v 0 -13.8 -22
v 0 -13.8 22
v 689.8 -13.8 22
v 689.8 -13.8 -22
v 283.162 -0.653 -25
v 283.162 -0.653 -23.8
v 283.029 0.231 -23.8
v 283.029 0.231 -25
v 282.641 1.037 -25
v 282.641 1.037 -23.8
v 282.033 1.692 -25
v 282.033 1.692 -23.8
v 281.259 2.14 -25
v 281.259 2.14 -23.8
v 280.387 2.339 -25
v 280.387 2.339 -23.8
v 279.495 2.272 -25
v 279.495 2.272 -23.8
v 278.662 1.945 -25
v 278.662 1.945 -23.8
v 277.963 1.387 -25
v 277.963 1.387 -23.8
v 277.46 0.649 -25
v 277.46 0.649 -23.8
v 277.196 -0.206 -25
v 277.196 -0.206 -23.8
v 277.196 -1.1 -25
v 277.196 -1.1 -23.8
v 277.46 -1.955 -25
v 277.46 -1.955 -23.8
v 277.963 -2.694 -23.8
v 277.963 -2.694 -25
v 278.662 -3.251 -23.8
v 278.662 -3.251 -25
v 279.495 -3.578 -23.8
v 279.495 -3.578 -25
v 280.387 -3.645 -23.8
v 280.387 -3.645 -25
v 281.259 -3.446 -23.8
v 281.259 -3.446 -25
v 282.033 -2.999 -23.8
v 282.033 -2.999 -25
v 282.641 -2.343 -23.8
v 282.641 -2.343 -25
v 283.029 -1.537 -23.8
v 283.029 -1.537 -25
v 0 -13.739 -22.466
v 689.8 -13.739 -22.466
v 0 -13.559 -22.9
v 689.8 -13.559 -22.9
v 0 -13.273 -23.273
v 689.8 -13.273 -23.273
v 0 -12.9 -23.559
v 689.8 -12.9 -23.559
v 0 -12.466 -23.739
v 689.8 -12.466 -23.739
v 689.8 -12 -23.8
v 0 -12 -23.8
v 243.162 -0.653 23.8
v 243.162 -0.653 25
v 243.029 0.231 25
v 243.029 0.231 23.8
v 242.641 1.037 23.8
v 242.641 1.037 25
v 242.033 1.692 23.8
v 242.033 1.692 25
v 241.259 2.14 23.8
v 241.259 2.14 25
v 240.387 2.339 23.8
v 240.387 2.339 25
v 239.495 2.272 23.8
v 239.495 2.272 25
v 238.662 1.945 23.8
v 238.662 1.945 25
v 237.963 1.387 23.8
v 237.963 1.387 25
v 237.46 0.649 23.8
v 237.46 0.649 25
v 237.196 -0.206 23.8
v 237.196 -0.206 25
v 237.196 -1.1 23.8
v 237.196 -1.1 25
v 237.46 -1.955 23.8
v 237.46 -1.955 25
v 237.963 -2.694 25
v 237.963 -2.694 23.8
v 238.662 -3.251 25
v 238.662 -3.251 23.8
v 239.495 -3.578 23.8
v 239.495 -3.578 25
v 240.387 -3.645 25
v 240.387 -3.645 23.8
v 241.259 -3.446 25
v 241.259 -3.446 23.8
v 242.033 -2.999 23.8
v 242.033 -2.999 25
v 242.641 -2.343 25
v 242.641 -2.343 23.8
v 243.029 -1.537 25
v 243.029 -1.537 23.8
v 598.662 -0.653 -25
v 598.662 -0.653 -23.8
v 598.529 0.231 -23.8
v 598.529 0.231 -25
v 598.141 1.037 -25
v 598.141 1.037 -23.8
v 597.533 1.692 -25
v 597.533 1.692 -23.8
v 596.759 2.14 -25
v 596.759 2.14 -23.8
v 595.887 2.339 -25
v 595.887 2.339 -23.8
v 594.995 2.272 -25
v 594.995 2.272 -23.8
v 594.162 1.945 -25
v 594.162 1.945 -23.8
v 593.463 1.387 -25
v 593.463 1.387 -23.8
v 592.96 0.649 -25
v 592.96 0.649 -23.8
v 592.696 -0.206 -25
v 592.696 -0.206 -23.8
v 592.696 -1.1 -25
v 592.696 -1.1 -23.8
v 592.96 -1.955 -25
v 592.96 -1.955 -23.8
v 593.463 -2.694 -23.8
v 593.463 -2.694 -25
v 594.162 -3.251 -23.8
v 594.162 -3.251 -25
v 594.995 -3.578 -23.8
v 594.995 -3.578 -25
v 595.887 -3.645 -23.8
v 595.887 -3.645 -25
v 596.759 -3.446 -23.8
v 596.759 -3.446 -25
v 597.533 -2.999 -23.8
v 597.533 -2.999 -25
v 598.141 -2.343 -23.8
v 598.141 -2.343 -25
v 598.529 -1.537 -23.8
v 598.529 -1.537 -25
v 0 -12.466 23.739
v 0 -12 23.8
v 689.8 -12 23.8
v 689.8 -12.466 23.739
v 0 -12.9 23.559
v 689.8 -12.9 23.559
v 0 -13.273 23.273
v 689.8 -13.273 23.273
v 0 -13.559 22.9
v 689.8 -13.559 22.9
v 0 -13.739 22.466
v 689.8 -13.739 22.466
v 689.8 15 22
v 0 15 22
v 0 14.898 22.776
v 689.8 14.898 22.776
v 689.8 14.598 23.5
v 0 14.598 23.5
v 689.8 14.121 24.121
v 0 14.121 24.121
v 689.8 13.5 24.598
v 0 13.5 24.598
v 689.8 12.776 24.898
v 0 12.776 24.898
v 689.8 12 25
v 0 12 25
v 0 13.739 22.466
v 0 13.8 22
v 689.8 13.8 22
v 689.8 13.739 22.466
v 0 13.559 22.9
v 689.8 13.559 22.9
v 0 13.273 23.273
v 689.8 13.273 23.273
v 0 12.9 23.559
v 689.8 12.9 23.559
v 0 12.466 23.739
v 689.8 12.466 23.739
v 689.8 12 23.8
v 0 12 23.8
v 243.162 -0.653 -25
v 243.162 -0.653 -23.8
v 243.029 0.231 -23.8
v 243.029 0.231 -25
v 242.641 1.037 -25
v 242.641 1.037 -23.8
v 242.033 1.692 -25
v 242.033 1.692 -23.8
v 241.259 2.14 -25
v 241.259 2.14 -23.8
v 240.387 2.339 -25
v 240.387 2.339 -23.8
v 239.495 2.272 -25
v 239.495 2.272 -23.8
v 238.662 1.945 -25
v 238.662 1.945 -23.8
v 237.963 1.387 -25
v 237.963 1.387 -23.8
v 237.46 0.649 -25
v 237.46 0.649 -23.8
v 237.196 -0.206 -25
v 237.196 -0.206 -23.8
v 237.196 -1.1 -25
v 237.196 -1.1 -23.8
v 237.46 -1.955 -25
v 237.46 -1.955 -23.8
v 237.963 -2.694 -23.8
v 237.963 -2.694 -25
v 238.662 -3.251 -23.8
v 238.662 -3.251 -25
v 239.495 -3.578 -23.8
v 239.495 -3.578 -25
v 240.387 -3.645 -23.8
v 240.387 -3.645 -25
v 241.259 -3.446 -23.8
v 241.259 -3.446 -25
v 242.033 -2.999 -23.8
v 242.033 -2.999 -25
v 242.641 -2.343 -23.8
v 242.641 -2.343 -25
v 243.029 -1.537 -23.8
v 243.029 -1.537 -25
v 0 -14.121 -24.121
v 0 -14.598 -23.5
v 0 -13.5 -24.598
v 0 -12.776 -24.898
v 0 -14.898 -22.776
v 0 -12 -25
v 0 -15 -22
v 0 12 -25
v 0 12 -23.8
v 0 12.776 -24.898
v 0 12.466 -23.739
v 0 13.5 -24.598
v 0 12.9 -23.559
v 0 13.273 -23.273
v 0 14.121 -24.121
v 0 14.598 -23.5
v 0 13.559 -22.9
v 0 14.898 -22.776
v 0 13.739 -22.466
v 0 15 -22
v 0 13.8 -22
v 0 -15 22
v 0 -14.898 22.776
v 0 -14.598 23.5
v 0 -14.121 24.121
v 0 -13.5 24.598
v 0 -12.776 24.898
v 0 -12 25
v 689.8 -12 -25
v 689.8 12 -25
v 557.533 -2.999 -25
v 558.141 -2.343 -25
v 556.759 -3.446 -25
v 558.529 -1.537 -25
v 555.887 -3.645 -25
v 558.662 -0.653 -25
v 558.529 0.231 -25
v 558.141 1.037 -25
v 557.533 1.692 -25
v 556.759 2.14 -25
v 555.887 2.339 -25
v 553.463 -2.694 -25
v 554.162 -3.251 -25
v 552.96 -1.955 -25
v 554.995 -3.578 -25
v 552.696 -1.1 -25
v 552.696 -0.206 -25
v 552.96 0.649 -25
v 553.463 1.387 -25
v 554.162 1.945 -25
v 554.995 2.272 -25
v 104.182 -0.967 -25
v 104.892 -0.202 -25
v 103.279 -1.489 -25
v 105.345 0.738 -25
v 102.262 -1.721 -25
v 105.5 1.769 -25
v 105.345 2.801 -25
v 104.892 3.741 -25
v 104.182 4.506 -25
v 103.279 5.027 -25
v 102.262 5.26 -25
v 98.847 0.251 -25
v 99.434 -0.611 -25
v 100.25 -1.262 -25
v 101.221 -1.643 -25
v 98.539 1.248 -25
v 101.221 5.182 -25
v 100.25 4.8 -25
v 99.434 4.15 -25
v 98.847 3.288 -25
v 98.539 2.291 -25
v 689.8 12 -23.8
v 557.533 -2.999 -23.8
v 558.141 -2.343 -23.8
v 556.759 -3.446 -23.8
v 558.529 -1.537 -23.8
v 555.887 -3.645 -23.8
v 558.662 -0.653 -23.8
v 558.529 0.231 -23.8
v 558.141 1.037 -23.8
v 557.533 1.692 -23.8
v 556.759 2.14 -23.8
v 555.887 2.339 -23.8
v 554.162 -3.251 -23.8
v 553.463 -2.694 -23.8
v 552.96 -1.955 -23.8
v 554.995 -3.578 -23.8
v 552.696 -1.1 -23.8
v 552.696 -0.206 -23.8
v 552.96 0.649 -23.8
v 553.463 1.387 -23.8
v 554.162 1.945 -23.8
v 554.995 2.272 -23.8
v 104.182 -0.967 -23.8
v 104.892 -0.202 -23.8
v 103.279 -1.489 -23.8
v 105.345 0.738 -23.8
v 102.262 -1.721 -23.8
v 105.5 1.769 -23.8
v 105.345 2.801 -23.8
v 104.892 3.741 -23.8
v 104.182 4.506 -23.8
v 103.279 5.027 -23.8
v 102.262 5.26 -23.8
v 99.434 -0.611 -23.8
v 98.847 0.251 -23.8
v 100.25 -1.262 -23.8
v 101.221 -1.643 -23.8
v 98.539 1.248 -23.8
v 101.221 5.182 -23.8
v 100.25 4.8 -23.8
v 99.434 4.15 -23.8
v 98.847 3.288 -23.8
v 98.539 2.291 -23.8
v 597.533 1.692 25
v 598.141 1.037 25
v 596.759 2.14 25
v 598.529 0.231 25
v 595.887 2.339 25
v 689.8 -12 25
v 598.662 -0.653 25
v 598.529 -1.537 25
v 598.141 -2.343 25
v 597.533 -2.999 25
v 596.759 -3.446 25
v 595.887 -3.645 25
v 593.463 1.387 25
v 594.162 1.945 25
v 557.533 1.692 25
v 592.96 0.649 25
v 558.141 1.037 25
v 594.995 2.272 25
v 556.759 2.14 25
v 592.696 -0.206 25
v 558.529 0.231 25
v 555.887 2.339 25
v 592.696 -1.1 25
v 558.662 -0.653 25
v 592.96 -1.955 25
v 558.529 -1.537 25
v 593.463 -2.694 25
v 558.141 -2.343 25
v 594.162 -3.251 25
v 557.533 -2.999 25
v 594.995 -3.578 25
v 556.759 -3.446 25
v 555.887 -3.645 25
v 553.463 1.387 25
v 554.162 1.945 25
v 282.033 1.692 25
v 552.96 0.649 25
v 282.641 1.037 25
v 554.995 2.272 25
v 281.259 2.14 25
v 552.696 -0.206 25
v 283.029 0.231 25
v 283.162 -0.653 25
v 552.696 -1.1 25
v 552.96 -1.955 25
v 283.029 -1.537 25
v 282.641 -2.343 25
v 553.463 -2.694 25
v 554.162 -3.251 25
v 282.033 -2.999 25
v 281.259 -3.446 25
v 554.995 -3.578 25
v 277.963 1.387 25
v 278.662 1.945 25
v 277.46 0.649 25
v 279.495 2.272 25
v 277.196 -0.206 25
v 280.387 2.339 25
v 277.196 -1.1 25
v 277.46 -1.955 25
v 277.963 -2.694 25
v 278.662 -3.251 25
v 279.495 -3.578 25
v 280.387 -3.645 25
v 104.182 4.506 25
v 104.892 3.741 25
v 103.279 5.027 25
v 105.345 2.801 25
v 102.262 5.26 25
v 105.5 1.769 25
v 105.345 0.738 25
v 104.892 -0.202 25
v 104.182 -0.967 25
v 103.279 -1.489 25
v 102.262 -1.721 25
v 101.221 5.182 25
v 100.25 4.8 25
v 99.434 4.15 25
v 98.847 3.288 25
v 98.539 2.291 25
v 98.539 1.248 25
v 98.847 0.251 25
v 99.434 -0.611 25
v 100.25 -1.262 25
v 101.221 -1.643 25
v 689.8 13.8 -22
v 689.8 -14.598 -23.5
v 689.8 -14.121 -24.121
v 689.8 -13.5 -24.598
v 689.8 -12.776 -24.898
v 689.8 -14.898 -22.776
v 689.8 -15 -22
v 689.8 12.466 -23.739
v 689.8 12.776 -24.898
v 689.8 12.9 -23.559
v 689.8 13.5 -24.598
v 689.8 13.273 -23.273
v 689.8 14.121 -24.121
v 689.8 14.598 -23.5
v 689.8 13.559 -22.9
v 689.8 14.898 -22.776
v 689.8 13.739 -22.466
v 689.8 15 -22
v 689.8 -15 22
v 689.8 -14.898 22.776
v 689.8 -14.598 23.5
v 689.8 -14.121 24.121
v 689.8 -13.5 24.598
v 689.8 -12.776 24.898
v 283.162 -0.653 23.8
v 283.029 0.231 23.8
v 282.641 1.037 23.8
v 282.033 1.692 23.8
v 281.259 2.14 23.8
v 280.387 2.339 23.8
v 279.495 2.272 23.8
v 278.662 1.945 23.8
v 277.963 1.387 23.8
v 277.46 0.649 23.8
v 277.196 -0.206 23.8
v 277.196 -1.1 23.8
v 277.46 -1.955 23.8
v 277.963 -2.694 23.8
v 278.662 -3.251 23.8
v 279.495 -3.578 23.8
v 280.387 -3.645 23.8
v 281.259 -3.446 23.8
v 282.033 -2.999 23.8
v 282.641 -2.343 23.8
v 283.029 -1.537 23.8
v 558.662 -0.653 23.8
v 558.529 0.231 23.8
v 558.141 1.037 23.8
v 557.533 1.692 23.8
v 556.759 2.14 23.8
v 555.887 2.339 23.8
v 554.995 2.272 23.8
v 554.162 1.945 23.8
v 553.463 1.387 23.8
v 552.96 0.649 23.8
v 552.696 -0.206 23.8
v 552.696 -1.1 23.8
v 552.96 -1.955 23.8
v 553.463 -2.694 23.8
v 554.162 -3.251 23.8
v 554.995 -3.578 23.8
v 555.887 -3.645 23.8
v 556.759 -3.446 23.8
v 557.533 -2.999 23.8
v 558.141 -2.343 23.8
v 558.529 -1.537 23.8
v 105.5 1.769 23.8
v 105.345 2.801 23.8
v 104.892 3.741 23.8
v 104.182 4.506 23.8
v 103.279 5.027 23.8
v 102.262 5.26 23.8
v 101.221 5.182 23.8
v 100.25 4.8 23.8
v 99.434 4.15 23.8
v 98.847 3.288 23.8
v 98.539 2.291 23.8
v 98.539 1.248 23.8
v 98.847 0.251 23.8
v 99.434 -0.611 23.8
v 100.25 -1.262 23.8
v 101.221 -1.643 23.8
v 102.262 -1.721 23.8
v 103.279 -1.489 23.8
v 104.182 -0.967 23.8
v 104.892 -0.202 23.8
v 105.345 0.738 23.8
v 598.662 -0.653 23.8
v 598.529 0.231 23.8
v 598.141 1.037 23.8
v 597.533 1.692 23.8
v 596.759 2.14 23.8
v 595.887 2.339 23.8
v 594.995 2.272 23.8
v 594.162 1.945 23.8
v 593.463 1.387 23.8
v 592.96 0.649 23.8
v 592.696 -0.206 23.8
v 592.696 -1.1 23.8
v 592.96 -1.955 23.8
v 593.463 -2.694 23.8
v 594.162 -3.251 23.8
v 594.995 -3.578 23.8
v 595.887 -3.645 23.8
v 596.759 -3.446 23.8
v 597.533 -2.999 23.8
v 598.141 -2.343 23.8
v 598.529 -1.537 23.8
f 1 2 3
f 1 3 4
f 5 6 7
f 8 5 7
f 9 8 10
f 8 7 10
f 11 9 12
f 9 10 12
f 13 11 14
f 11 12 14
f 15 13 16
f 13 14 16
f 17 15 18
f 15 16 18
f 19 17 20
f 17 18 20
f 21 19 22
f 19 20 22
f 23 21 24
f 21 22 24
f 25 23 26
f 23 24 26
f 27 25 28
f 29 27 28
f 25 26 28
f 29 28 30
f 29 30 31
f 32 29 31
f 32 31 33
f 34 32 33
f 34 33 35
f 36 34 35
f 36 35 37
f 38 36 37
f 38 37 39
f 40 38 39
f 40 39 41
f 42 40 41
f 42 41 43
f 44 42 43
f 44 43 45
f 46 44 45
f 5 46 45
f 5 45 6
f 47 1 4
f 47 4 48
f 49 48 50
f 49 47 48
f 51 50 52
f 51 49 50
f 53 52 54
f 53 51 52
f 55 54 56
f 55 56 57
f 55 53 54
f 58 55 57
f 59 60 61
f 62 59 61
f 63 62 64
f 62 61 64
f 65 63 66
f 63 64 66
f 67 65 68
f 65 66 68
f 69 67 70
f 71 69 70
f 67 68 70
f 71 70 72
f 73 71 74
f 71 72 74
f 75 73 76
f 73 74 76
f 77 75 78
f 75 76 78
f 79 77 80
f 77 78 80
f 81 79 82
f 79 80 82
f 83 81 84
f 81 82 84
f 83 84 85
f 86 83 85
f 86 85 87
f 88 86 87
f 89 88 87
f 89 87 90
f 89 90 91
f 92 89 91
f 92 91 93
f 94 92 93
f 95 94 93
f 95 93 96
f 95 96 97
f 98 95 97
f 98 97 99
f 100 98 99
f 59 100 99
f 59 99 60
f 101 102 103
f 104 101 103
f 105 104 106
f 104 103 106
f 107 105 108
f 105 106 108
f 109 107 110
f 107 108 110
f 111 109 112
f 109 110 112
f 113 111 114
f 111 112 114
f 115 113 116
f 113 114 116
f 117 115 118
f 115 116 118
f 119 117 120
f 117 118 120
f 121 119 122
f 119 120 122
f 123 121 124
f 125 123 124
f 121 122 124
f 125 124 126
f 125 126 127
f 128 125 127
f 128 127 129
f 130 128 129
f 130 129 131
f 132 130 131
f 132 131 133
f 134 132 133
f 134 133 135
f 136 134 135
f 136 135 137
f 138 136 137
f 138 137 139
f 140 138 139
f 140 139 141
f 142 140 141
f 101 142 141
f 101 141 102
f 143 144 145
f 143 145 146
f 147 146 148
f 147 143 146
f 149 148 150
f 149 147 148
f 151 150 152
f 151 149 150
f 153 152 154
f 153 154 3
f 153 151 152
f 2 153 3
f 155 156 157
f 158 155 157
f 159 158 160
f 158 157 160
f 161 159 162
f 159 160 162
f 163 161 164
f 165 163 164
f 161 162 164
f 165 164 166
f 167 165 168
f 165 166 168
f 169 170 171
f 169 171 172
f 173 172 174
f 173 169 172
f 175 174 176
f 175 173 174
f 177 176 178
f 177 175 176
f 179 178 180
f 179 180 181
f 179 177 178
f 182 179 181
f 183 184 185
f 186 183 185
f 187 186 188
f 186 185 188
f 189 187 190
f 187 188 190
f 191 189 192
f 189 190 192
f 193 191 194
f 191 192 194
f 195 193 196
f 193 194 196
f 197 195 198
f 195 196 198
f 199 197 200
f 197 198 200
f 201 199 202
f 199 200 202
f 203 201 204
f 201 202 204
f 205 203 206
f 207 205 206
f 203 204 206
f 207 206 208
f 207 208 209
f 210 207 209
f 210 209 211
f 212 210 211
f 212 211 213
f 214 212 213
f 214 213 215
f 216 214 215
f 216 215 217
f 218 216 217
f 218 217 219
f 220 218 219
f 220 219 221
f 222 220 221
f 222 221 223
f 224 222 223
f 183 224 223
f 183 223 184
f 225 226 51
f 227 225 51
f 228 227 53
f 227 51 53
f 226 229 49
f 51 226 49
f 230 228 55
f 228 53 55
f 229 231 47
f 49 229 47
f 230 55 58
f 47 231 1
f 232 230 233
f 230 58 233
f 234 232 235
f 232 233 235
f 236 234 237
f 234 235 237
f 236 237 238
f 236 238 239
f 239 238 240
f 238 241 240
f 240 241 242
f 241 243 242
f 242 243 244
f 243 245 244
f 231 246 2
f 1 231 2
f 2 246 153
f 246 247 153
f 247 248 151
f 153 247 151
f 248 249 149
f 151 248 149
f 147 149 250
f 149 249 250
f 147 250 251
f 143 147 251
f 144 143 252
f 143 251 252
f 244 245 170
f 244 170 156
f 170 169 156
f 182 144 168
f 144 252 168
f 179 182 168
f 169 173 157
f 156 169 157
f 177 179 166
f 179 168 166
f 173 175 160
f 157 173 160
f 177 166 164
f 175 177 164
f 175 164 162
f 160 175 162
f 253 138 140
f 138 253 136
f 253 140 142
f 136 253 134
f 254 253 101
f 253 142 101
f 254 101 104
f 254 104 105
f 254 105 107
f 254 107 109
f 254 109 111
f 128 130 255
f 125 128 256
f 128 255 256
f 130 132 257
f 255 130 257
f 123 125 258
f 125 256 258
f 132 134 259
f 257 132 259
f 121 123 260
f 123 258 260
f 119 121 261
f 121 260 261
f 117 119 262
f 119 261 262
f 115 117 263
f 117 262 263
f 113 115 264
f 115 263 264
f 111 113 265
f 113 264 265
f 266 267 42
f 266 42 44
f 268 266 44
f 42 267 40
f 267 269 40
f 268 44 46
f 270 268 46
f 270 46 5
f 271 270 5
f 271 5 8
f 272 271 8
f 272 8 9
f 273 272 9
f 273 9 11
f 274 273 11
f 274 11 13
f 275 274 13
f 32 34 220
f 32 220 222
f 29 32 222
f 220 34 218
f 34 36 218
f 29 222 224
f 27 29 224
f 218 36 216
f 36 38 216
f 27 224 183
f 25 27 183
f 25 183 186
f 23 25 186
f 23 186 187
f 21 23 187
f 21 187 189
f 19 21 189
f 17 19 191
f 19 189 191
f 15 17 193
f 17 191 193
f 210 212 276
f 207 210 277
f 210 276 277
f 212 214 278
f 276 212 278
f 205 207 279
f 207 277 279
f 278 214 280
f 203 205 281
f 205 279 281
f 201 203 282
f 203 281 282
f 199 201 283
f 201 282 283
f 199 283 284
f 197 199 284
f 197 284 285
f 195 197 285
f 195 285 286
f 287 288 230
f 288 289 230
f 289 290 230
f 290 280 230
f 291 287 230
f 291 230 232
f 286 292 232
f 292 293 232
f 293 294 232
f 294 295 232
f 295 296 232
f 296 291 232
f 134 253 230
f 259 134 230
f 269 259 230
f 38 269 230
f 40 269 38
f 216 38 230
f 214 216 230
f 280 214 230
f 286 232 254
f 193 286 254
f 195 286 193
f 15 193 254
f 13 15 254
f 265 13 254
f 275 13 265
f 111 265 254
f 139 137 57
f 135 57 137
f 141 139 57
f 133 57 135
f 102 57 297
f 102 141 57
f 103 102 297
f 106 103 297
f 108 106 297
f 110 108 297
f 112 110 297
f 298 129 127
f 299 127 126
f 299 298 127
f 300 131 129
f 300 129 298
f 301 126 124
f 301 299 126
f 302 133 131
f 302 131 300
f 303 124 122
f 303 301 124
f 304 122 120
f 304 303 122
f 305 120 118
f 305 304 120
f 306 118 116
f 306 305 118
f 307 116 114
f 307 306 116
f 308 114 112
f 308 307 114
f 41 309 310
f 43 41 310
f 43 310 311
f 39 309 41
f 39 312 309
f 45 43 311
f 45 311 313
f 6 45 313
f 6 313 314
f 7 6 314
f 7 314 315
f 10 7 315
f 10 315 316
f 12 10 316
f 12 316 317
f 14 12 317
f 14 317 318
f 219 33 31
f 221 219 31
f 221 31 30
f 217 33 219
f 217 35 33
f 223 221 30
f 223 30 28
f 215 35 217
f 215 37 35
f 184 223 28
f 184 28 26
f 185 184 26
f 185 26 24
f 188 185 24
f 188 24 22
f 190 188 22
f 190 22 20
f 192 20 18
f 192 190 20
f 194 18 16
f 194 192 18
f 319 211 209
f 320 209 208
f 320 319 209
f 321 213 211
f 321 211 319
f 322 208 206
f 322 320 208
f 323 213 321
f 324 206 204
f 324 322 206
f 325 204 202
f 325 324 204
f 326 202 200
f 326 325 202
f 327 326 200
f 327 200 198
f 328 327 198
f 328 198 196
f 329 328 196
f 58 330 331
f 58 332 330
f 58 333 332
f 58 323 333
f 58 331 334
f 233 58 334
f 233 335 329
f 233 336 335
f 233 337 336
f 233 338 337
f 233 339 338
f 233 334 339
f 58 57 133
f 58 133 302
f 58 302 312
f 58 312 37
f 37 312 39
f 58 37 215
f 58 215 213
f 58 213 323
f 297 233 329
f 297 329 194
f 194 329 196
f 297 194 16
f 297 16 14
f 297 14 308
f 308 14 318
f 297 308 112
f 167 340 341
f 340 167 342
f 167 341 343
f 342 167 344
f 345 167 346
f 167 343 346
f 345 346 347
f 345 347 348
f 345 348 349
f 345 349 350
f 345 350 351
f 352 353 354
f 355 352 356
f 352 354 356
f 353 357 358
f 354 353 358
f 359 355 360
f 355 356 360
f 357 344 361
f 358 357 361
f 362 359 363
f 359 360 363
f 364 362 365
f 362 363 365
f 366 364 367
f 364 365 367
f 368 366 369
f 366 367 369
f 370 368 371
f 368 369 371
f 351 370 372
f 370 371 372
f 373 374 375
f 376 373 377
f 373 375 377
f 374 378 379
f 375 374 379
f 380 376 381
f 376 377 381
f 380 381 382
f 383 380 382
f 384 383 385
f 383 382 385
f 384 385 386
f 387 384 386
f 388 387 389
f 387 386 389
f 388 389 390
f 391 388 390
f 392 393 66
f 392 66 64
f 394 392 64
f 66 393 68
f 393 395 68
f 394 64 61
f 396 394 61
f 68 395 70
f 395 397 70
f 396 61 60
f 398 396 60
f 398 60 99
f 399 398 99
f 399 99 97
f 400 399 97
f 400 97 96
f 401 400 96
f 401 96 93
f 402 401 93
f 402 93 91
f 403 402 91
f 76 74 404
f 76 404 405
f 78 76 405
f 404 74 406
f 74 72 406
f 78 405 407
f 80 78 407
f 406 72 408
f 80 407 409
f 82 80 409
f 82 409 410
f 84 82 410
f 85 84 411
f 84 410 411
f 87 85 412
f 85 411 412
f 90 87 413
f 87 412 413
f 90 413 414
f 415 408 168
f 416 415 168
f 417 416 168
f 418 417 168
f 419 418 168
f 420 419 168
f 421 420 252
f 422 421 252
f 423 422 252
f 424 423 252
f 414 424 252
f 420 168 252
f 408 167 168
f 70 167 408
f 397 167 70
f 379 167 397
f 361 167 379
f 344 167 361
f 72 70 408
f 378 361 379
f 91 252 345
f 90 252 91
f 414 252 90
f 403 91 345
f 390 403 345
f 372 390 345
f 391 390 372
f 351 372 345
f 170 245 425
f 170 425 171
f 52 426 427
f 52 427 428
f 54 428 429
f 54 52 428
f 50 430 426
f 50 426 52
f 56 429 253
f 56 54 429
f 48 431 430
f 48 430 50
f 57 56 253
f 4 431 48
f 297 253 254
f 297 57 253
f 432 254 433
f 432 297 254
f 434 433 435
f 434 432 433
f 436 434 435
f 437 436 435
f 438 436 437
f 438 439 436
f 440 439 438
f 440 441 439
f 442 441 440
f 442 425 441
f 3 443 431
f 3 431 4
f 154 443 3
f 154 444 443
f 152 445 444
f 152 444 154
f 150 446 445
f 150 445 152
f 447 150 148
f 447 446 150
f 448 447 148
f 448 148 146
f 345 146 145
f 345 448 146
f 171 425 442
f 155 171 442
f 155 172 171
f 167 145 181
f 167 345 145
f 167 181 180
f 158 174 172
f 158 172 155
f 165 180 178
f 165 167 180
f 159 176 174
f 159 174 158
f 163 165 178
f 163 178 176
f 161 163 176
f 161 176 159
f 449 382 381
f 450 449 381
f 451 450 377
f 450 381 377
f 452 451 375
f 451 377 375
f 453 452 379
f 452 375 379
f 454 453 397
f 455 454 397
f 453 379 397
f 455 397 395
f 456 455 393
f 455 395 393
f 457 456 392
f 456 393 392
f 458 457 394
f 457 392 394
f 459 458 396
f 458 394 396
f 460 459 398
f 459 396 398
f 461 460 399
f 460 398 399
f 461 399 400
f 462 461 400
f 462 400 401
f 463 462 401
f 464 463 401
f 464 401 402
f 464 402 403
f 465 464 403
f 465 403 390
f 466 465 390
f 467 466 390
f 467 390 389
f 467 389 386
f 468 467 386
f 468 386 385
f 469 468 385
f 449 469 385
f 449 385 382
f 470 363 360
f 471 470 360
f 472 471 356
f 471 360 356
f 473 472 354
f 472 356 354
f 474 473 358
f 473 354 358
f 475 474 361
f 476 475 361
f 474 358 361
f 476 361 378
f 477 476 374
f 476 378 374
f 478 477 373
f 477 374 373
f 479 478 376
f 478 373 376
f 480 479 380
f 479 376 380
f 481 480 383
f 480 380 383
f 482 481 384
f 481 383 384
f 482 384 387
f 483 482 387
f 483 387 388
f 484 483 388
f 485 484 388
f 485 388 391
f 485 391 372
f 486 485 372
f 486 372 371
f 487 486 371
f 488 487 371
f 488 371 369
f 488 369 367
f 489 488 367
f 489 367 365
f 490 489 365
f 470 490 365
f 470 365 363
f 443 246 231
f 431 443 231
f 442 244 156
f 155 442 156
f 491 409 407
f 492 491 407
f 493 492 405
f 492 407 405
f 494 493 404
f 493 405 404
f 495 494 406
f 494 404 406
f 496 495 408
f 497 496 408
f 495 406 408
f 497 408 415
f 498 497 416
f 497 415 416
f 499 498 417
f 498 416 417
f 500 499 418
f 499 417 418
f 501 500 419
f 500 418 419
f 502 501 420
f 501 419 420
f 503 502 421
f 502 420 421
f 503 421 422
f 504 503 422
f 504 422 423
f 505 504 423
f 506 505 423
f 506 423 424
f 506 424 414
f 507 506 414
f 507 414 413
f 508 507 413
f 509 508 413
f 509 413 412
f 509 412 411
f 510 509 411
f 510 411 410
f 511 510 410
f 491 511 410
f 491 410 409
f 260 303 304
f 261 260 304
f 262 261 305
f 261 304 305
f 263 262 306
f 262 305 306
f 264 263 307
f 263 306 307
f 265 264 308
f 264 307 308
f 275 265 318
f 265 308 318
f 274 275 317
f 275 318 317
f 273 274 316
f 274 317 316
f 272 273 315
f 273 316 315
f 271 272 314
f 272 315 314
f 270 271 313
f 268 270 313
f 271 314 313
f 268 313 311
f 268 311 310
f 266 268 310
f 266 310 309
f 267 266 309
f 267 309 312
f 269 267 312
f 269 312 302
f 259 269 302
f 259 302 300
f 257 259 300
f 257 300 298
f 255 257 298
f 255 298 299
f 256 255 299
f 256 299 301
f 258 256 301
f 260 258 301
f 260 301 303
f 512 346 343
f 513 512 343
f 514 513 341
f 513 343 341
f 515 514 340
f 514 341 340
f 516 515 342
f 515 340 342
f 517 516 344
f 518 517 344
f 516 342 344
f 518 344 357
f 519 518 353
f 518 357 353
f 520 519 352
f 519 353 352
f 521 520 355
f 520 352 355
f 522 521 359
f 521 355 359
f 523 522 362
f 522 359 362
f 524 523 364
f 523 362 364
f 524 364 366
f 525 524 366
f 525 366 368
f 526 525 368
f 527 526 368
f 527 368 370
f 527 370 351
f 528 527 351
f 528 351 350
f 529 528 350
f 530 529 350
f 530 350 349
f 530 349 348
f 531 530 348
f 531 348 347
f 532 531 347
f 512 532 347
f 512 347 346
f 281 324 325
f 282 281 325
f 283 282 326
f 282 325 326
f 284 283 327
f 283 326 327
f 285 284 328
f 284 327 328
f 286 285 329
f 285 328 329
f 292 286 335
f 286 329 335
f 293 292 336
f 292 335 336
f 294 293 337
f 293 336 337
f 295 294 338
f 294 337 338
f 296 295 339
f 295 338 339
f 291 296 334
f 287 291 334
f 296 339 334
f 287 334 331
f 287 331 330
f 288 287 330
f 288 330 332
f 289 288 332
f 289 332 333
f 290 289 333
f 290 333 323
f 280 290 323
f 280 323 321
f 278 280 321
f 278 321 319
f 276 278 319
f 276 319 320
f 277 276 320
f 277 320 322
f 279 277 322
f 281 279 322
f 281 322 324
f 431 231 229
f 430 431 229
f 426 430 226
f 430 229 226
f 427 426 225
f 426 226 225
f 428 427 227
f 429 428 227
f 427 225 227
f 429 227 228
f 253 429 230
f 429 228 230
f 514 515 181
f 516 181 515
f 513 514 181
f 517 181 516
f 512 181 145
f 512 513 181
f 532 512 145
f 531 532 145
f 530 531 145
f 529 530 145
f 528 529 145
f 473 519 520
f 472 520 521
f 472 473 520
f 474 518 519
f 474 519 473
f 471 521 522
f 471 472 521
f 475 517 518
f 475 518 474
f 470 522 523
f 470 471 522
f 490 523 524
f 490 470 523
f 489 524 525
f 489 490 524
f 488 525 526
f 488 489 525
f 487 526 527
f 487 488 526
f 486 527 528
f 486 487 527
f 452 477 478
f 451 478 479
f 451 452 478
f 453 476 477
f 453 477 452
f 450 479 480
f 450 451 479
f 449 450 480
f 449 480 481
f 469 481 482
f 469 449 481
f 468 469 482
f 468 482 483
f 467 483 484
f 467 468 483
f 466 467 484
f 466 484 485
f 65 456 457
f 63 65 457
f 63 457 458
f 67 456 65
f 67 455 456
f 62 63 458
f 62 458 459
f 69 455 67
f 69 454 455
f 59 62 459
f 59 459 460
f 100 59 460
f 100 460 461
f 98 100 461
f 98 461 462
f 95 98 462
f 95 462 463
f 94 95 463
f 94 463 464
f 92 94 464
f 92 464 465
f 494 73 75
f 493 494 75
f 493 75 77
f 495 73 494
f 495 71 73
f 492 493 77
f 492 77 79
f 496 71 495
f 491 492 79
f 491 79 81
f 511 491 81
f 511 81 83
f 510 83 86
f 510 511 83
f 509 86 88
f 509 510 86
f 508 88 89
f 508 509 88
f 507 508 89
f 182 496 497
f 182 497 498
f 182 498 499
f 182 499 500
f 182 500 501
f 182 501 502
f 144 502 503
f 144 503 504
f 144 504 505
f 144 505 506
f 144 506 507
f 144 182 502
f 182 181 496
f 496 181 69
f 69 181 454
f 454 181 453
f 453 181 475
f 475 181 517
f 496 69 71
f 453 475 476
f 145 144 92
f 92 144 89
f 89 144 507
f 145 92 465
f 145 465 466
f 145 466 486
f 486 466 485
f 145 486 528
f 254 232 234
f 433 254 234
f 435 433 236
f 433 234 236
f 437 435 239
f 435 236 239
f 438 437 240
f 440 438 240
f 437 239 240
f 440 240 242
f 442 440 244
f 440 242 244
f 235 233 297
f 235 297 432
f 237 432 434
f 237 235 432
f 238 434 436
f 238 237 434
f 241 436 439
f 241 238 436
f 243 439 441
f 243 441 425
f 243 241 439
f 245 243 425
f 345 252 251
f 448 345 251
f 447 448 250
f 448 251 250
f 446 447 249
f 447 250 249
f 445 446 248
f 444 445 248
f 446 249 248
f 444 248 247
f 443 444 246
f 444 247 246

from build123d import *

# Parameters (mm, degrees)
TUBO_RETANGULAR_50_X_30_X_2_6_1_DEPTH = 689.8
ESBO_O5_R                             = 3
CORTE_EXTRUS_O4_DEPTH                 = 692.772390313
ESBO_O6_R                             = 3.5
CORTE_EXTRUS_O5_DEPTH                 = 692.772390313


with BuildPart() as part:
    # Sketch1 → Tubo retangular 50 X 30 X 2.6(1) (new body)
    with BuildSketch(Plane.YZ):
        with BuildLine():
            Line((-12, -25), (12, -25))
            ThreePointArc((12, -25), (14.121320344, -24.121320344), (15, -22))
            Line((15, -22), (15, 22))
            ThreePointArc((15, 22), (14.121320344, 24.121320344), (12, 25))
            Line((12, 25), (-12, 25))
            ThreePointArc((-12, 25), (-14.121320344, 24.121320344), (-15, 22))
            Line((-15, 22), (-15, -22))
            ThreePointArc((-15, -22), (-14.121320344, -24.121320344), (-12, -25))
        make_face()
        with BuildLine():
            Line((-12, -23.8), (12, -23.8))
            ThreePointArc((12, -23.8), (13.272792206, -23.272792206), (13.8, -22))
            Line((13.8, -22), (13.8, 22))
            ThreePointArc((13.8, 22), (13.272792206, 23.272792206), (12, 23.8))
            Line((12, 23.8), (-12, 23.8))
            ThreePointArc((-12, 23.8), (-13.272792206, 23.272792206), (-13.8, 22))
            Line((-13.8, 22), (-13.8, -22))
            ThreePointArc((-13.8, -22), (-13.272792206, -23.272792206), (-12, -23.8))
        make_face(mode=Mode.SUBTRACT)
    extrude(amount=TUBO_RETANGULAR_50_X_30_X_2_6_1_DEPTH)

    # Esboço5 → Corte-extrusão4 (cut, through all)
    with BuildSketch(Plane.XY.offset(25)):
        with Locations((280.1625, -0.6530272)):
            Circle(ESBO_O5_R)
        with Locations((240.1625, -0.6530272)):
            Circle(ESBO_O5_R)
        with Locations((595.6625, -0.6530272)):
            Circle(ESBO_O5_R)
        with Locations((555.6625, -0.6530272)):
            Circle(ESBO_O5_R)
    extrude(amount=-CORTE_EXTRUS_O4_DEPTH, mode=Mode.SUBTRACT)

    # Esboço6 → Corte-extrusão5 (cut, through all)
    with BuildSketch(Plane.XY.offset(25)):
        with Locations((102, 1.769410095)):
            Circle(ESBO_O6_R)
    extrude(amount=-CORTE_EXTRUS_O5_DEPTH, mode=Mode.SUBTRACT)


solid = part.part
